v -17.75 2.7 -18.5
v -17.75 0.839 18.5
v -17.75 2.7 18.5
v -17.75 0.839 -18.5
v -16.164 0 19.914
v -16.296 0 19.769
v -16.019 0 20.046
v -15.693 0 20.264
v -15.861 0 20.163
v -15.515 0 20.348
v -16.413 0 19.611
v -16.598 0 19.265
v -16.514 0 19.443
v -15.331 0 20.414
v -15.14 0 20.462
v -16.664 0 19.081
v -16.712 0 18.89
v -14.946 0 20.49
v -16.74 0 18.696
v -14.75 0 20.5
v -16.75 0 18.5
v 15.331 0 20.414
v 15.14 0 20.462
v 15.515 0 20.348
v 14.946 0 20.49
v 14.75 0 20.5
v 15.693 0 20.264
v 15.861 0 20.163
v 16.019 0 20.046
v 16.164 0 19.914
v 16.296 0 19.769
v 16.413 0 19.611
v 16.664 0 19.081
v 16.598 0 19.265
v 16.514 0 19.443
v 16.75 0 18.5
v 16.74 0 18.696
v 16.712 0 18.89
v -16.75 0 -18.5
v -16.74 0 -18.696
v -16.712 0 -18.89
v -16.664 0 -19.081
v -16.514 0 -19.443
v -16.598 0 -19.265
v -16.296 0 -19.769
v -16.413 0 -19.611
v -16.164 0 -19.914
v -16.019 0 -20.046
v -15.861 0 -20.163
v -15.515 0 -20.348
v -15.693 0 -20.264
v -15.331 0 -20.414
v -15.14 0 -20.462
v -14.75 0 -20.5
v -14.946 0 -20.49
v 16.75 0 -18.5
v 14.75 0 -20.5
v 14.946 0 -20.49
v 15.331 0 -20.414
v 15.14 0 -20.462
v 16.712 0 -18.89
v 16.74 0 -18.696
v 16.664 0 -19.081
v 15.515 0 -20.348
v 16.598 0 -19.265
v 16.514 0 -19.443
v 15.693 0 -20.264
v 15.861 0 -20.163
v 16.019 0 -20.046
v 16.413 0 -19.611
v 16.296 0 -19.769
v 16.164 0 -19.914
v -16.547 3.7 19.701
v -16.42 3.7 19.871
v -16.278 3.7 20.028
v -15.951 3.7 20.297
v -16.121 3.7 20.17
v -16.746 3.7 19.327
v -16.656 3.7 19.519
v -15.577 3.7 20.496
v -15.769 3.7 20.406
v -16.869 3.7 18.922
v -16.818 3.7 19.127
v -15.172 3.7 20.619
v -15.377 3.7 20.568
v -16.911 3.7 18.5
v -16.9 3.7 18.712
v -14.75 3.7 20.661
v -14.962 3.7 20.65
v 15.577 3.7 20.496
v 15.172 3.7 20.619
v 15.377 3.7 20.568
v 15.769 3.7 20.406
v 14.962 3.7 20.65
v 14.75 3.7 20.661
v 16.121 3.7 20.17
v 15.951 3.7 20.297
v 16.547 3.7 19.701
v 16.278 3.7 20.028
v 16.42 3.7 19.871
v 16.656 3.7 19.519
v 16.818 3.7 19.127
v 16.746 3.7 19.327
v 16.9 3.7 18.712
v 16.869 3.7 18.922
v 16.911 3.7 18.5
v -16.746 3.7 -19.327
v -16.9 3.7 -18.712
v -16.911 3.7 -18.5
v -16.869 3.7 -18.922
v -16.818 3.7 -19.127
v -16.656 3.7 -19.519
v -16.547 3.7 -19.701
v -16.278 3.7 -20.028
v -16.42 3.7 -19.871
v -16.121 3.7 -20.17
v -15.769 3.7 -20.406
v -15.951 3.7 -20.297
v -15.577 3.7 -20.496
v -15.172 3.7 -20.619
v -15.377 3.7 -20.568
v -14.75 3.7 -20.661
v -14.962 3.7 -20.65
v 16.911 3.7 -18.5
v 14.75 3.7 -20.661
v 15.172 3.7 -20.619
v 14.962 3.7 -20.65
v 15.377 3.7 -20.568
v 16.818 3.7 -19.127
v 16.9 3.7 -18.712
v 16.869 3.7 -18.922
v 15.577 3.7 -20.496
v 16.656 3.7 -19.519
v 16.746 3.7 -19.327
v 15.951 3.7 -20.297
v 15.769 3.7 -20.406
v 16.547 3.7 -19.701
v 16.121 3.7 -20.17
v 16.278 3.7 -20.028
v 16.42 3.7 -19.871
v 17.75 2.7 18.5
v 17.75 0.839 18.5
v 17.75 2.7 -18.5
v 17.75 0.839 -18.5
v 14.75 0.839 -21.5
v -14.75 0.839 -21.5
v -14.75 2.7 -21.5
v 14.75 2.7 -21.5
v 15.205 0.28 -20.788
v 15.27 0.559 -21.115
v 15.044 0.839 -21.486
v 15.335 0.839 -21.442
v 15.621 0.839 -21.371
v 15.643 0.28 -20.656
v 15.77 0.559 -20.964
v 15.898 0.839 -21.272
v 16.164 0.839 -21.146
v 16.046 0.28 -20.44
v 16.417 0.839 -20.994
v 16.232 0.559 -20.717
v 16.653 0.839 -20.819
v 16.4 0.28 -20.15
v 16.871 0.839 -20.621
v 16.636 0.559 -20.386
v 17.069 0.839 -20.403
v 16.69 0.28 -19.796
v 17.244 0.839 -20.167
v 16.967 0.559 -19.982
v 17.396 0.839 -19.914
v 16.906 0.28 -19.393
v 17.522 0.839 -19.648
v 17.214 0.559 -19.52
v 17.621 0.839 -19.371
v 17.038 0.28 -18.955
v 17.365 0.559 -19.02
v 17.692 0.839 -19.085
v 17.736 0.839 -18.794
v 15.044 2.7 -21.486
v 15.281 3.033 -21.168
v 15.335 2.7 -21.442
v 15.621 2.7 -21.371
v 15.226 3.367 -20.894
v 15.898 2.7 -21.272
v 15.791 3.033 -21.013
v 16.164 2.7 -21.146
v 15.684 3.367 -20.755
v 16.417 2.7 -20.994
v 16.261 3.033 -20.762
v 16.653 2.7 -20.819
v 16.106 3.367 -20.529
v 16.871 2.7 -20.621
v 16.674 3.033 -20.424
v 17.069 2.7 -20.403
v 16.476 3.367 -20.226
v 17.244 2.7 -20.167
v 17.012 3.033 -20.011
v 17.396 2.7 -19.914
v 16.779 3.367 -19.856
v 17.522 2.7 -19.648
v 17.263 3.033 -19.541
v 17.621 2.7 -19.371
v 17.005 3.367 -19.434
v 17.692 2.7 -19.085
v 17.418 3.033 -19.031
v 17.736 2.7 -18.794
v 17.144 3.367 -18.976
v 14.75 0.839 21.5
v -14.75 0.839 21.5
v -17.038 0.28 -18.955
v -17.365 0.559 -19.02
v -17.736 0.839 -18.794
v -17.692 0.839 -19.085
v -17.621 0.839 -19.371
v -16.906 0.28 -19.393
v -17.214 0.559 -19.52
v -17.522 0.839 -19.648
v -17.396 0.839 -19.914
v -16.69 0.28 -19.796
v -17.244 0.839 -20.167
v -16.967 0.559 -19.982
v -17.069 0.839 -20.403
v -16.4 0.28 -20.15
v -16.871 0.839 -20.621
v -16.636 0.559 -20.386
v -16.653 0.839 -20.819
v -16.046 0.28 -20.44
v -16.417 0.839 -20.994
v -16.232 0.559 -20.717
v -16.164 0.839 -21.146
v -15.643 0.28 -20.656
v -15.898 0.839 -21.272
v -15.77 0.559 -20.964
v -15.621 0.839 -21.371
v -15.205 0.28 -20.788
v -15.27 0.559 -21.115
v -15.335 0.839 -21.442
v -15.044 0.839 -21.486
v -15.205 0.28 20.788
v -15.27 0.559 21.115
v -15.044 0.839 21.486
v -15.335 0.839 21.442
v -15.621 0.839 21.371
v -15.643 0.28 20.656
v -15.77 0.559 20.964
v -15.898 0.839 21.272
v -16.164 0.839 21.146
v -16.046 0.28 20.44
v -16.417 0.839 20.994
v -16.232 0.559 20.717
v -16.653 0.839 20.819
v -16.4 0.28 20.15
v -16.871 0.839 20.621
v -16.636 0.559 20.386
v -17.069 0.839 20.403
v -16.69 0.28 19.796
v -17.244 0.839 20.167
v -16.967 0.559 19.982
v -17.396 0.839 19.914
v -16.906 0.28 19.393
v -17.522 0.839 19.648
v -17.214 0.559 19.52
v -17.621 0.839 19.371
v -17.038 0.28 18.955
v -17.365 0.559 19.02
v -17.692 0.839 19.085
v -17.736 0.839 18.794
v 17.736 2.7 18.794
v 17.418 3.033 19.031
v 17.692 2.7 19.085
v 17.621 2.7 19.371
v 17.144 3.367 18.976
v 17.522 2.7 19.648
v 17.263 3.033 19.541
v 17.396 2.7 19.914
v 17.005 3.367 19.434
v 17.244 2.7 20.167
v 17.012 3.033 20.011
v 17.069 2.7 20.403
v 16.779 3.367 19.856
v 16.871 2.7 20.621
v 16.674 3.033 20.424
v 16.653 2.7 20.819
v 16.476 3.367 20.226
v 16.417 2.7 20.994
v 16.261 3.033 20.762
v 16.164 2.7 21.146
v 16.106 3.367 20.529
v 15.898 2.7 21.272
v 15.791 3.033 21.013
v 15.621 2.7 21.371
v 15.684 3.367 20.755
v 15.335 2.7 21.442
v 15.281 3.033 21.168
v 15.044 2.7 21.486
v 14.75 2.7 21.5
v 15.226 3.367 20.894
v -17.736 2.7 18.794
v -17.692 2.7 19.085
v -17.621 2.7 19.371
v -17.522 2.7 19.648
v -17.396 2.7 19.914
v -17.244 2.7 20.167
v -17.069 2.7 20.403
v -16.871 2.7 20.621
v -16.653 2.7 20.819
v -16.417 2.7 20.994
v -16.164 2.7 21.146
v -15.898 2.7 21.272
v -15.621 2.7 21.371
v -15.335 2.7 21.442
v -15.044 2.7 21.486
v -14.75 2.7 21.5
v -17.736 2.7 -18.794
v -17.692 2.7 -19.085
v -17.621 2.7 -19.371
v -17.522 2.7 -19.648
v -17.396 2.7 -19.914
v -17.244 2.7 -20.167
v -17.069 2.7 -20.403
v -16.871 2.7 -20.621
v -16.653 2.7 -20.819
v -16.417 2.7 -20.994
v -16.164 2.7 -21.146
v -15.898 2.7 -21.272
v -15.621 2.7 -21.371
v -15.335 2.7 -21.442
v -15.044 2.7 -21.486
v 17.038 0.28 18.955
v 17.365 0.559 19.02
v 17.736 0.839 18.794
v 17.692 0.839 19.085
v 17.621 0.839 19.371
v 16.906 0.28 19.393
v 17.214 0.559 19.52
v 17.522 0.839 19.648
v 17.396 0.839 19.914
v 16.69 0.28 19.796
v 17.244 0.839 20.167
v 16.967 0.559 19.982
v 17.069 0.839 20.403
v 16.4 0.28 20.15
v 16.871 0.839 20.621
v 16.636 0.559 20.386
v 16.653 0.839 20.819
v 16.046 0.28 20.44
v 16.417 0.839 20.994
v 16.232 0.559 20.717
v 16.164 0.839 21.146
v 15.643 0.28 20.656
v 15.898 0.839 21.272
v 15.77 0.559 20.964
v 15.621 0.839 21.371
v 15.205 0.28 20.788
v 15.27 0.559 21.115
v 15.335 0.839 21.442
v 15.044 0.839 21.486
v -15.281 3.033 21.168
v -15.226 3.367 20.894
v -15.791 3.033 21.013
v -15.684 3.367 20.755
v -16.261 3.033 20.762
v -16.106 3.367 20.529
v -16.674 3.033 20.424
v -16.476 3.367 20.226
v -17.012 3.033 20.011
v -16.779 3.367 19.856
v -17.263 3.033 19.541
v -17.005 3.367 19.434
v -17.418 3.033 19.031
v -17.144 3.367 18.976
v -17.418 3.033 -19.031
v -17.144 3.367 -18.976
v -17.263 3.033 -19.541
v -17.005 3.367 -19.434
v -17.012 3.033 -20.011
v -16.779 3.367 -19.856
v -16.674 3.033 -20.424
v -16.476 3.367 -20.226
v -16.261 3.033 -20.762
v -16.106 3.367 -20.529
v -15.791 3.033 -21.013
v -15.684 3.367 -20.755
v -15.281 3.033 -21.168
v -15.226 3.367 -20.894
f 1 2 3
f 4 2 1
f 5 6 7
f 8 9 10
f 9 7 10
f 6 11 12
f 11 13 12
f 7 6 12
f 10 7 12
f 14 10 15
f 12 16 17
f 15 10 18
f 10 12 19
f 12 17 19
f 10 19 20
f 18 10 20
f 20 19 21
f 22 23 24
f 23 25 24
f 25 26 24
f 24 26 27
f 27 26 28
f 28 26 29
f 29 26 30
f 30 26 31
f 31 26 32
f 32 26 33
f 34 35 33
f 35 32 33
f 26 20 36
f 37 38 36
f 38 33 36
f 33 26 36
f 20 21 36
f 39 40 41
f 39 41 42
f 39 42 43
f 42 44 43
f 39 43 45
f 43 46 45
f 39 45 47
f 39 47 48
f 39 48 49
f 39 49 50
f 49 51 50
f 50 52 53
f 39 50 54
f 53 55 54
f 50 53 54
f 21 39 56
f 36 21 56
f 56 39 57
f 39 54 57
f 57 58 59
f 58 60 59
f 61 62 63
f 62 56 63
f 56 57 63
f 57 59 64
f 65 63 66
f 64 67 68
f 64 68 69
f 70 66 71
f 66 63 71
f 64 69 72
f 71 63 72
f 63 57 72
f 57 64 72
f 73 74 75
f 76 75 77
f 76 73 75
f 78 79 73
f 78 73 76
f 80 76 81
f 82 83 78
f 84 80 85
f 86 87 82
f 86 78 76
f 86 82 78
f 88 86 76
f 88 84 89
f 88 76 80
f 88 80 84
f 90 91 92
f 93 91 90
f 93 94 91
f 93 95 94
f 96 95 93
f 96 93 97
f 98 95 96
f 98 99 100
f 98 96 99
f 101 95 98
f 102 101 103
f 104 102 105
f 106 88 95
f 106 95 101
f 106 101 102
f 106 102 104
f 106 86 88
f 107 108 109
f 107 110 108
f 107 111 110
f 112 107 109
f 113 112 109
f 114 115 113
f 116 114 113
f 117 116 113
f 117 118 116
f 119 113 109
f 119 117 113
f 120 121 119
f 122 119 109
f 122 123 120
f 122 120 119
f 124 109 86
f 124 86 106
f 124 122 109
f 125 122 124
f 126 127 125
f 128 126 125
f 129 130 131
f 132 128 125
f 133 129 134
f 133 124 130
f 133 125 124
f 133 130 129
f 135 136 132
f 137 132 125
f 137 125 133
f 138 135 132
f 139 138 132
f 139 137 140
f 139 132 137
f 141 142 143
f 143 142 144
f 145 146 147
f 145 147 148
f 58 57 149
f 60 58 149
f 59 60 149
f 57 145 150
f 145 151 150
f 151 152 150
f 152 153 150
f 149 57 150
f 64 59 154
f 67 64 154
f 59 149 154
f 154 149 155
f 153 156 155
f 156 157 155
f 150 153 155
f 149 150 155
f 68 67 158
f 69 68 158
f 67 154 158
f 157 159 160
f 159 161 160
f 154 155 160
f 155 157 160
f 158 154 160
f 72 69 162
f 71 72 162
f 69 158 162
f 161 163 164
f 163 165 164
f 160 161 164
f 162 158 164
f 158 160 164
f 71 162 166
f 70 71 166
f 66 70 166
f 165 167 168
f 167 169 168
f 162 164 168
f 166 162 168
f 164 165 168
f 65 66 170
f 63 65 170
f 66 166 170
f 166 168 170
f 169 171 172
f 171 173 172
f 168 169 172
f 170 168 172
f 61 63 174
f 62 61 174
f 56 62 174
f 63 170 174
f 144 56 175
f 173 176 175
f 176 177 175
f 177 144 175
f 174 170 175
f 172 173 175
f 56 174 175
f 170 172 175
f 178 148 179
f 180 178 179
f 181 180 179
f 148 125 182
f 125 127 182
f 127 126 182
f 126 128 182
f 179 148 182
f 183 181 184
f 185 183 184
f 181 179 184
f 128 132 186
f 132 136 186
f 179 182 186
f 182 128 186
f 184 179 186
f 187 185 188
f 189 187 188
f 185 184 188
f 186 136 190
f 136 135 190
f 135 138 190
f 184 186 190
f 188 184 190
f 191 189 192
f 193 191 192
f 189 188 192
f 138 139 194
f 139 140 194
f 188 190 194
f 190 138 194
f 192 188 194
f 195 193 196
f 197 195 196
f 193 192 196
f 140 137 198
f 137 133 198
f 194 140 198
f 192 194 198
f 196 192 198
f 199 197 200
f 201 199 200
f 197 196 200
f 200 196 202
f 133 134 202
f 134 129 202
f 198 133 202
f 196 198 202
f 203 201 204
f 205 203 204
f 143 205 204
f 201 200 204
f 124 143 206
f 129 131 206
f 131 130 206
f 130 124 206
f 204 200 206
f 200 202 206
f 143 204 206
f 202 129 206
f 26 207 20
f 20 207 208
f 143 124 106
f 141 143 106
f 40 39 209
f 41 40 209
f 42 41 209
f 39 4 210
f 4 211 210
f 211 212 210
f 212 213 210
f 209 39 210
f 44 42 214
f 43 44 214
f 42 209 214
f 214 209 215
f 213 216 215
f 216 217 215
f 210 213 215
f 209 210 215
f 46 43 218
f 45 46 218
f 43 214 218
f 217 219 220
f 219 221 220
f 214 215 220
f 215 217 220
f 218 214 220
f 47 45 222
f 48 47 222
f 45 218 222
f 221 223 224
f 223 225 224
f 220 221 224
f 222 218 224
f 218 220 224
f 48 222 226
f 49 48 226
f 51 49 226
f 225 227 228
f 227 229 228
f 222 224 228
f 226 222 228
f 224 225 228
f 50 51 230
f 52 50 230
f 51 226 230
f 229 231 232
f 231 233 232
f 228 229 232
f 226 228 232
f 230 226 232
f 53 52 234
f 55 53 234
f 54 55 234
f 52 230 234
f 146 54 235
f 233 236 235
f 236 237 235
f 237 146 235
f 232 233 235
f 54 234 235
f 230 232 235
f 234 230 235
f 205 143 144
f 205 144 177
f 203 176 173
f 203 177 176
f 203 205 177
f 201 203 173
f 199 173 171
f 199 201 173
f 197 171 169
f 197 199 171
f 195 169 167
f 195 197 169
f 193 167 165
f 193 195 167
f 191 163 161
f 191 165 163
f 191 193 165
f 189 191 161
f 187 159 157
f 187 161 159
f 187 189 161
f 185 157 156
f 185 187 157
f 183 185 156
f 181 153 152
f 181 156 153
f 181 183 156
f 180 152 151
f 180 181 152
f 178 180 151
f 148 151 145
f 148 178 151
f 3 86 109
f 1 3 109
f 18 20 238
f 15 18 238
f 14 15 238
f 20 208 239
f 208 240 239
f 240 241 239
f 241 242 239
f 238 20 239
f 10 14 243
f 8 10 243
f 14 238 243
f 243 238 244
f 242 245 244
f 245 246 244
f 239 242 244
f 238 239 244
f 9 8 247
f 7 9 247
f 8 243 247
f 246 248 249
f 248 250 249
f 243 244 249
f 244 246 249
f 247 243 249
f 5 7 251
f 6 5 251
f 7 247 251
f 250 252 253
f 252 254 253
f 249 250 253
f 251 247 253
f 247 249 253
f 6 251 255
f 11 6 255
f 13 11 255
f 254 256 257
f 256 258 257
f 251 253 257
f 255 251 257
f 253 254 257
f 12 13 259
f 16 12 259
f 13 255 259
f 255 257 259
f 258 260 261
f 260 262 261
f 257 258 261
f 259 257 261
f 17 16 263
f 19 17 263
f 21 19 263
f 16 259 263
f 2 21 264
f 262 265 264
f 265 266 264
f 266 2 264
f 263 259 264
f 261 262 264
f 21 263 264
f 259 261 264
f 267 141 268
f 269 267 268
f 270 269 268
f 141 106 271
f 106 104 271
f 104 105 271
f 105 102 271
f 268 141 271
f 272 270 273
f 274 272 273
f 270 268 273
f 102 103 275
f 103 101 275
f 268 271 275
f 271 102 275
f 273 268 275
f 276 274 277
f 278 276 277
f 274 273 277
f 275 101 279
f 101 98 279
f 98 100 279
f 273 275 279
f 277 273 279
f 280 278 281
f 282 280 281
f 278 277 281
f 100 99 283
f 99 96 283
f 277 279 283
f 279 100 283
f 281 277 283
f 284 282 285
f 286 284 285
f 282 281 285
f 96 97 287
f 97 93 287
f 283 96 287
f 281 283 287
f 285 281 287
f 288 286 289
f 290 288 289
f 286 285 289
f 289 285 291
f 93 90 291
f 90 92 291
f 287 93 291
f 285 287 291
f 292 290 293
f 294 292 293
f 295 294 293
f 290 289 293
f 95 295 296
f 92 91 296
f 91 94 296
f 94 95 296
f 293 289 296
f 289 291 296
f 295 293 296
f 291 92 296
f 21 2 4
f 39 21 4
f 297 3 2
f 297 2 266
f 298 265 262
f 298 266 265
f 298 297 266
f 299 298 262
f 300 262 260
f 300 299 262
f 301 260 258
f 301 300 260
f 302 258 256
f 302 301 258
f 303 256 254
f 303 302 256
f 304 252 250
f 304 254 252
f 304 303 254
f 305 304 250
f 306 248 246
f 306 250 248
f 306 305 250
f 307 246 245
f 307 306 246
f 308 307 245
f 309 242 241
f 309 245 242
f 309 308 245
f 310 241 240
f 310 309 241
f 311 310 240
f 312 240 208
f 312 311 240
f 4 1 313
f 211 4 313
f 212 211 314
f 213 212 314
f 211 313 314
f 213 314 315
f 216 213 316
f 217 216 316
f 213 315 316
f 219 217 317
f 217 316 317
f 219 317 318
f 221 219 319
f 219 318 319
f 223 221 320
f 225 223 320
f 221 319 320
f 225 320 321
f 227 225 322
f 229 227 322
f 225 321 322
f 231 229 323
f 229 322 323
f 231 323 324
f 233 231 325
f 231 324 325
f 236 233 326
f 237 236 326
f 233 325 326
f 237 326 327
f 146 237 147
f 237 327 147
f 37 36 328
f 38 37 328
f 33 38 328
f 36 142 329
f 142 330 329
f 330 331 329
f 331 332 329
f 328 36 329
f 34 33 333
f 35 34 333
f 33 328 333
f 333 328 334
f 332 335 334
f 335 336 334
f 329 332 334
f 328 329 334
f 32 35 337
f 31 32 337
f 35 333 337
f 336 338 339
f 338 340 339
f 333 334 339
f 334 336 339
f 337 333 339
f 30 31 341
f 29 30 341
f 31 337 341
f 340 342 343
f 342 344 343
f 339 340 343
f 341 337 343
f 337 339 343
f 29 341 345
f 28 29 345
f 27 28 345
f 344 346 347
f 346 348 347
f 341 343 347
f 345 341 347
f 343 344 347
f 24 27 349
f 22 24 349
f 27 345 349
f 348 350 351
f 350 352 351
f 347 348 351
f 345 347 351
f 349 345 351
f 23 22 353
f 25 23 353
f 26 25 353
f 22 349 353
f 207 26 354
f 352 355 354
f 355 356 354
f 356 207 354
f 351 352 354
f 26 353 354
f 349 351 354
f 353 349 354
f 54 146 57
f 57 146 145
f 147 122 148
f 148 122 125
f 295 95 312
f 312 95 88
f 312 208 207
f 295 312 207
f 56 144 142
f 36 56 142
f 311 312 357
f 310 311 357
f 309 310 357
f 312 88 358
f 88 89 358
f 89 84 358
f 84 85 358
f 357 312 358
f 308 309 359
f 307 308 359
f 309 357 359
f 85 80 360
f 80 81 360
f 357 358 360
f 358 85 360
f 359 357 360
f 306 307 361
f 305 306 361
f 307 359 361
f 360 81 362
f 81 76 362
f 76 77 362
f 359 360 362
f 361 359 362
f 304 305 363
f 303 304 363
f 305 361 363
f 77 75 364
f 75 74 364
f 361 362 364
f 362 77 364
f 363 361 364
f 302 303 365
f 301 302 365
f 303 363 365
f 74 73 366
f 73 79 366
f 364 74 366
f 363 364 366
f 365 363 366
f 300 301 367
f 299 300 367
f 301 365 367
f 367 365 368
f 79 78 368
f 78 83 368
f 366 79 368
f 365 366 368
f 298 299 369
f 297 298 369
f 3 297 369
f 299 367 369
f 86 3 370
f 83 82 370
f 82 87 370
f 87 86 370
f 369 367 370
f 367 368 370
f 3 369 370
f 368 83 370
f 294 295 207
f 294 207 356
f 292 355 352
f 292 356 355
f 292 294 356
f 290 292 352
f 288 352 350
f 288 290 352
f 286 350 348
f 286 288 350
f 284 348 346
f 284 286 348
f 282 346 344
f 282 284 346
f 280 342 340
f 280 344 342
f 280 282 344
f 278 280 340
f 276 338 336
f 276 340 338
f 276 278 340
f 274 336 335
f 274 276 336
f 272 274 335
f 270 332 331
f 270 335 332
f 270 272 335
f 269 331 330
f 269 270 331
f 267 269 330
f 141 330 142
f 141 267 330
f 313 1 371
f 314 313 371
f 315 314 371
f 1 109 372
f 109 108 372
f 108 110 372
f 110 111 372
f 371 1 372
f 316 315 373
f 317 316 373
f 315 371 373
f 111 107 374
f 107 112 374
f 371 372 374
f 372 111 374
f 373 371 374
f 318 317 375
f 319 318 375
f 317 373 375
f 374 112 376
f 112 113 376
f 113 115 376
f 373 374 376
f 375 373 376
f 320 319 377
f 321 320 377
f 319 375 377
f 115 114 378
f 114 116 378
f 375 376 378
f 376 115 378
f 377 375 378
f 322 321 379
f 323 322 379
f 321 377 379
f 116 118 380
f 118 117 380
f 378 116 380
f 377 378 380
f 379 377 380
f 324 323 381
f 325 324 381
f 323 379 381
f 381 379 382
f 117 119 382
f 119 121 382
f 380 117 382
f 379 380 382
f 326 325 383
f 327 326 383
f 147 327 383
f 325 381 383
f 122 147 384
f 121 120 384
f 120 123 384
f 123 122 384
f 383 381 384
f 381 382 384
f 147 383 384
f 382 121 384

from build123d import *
from OCP.BRepFilletAPI import BRepFilletAPI_MakeChamfer

# Parameters (mm, degrees)
SKETCH_1_W      = 35.5
SKETCH_1_H      = 43
EXTRUDE_1_DEPTH = 3.7
FILLET_1_R      = 3
CHAMFER_1_SIZE  = 1
CHAMFER_1_SIZE2 = 0.839099631


with BuildPart() as part:
    # Эскиз1 → Бобышка-Вытянуть1 (new body)
    with BuildSketch(Plane(origin=(0, 0, 0), x_dir=(1, 0, 0), z_dir=(0, 1, 0))):
        Rectangle(SKETCH_1_W, SKETCH_1_H)
    extrude(amount=EXTRUDE_1_DEPTH)

    # Скругление1
    fillet_1_edges = [part.edges().sort_by_distance(p)[0] for p in [
        (17.75, 1.85, 21.5),
        (-17.75, 1.85, 21.5),
        (-17.75, 1.85, -21.5),
        (17.75, 1.85, -21.5),
    ]]
    fillet(fillet_1_edges, radius=FILLET_1_R)

    # Фаска1: one chamfer whose edges measure the first distance from different faces: ONE call of the kernel's chamfer builder (chamfer() names one face for all edges)
    chamfer_1_edges_1 = [part.edges().sort_by_distance(p)[0] for p in [
        (-17.75, 0, 0),
        (17.75, 0, 0),
        (0, 0, 21.5),
        (0, 0, -21.5),
        (-16.871320344, 0, 20.621320344),
        (16.871320344, 0, 20.621320344),
        (16.871320344, 0, -20.621320344),
        (-16.871320344, 0, -20.621320344),
    ]]
    chamfer_1_side_1 = [part.faces().sort_by_distance(p)[0] for p in [
        (0, 0, 0),
    ]]
    chamfer_1_edges_2 = [part.edges().sort_by_distance(p)[0] for p in [
        (-17.75, 3.7, 0),
    ]]
    chamfer_1_side_2 = [part.faces().sort_by_distance(p)[0] for p in [
        (-17.75, 1.85, 0),
    ]]
    chamfer_1_edges_3 = [part.edges().sort_by_distance(p)[0] for p in [
        (0, 3.7, -21.5),
    ]]
    chamfer_1_side_3 = [part.faces().sort_by_distance(p)[0] for p in [
        (0, 1.85, -21.5),
    ]]
    chamfer_1_edges_4 = [part.edges().sort_by_distance(p)[0] for p in [
        (17.75, 3.7, 0),
    ]]
    chamfer_1_side_4 = [part.faces().sort_by_distance(p)[0] for p in [
        (17.75, 1.85, 0),
    ]]
    chamfer_1_edges_5 = [part.edges().sort_by_distance(p)[0] for p in [
        (0, 3.7, 21.5),
    ]]
    chamfer_1_side_5 = [part.faces().sort_by_distance(p)[0] for p in [
        (0, 1.85, 21.5),
    ]]
    chamfer_1_edges_6 = [part.edges().sort_by_distance(p)[0] for p in [
        (-16.871320344, 3.7, 20.621320344),
    ]]
    chamfer_1_side_6 = [part.faces().sort_by_distance(p)[0] for p in [
        (-16.871320344, 1.85, 20.621320344),
    ]]
    chamfer_1_edges_7 = [part.edges().sort_by_distance(p)[0] for p in [
        (16.871320344, 3.7, 20.621320344),
    ]]
    chamfer_1_side_7 = [part.faces().sort_by_distance(p)[0] for p in [
        (16.871320344, 1.85, 20.621320344),
    ]]
    chamfer_1_edges_8 = [part.edges().sort_by_distance(p)[0] for p in [
        (16.871320344, 3.7, -20.621320344),
    ]]
    chamfer_1_side_8 = [part.faces().sort_by_distance(p)[0] for p in [
        (16.871320344, 1.85, -20.621320344),
    ]]
    chamfer_1_edges_9 = [part.edges().sort_by_distance(p)[0] for p in [
        (-16.871320344, 3.7, -20.621320344),
    ]]
    chamfer_1_side_9 = [part.faces().sort_by_distance(p)[0] for p in [
        (-16.871320344, 1.85, -20.621320344),
    ]]
    chamfer_1 = BRepFilletAPI_MakeChamfer(part.part.solid().wrapped)
    for e in chamfer_1_edges_1:
        chamfer_1.Add(CHAMFER_1_SIZE, CHAMFER_1_SIZE2, e.wrapped, chamfer_1_side_1[0].wrapped)  # the first distance lies on this face
    for e in chamfer_1_edges_2:
        chamfer_1.Add(CHAMFER_1_SIZE, CHAMFER_1_SIZE2, e.wrapped, chamfer_1_side_2[0].wrapped)  # the first distance lies on this face
    for e in chamfer_1_edges_3:
        chamfer_1.Add(CHAMFER_1_SIZE, CHAMFER_1_SIZE2, e.wrapped, chamfer_1_side_3[0].wrapped)  # the first distance lies on this face
    for e in chamfer_1_edges_4:
        chamfer_1.Add(CHAMFER_1_SIZE, CHAMFER_1_SIZE2, e.wrapped, chamfer_1_side_4[0].wrapped)  # the first distance lies on this face
    for e in chamfer_1_edges_5:
        chamfer_1.Add(CHAMFER_1_SIZE, CHAMFER_1_SIZE2, e.wrapped, chamfer_1_side_5[0].wrapped)  # the first distance lies on this face
    for e in chamfer_1_edges_6:
        chamfer_1.Add(CHAMFER_1_SIZE, CHAMFER_1_SIZE2, e.wrapped, chamfer_1_side_6[0].wrapped)  # the first distance lies on this face
    for e in chamfer_1_edges_7:
        chamfer_1.Add(CHAMFER_1_SIZE, CHAMFER_1_SIZE2, e.wrapped, chamfer_1_side_7[0].wrapped)  # the first distance lies on this face
    for e in chamfer_1_edges_8:
        chamfer_1.Add(CHAMFER_1_SIZE, CHAMFER_1_SIZE2, e.wrapped, chamfer_1_side_8[0].wrapped)  # the first distance lies on this face
    for e in chamfer_1_edges_9:
        chamfer_1.Add(CHAMFER_1_SIZE, CHAMFER_1_SIZE2, e.wrapped, chamfer_1_side_9[0].wrapped)  # the first distance lies on this face
    add(Compound.cast(chamfer_1.Shape()), mode=Mode.REPLACE)


solid = part.part
